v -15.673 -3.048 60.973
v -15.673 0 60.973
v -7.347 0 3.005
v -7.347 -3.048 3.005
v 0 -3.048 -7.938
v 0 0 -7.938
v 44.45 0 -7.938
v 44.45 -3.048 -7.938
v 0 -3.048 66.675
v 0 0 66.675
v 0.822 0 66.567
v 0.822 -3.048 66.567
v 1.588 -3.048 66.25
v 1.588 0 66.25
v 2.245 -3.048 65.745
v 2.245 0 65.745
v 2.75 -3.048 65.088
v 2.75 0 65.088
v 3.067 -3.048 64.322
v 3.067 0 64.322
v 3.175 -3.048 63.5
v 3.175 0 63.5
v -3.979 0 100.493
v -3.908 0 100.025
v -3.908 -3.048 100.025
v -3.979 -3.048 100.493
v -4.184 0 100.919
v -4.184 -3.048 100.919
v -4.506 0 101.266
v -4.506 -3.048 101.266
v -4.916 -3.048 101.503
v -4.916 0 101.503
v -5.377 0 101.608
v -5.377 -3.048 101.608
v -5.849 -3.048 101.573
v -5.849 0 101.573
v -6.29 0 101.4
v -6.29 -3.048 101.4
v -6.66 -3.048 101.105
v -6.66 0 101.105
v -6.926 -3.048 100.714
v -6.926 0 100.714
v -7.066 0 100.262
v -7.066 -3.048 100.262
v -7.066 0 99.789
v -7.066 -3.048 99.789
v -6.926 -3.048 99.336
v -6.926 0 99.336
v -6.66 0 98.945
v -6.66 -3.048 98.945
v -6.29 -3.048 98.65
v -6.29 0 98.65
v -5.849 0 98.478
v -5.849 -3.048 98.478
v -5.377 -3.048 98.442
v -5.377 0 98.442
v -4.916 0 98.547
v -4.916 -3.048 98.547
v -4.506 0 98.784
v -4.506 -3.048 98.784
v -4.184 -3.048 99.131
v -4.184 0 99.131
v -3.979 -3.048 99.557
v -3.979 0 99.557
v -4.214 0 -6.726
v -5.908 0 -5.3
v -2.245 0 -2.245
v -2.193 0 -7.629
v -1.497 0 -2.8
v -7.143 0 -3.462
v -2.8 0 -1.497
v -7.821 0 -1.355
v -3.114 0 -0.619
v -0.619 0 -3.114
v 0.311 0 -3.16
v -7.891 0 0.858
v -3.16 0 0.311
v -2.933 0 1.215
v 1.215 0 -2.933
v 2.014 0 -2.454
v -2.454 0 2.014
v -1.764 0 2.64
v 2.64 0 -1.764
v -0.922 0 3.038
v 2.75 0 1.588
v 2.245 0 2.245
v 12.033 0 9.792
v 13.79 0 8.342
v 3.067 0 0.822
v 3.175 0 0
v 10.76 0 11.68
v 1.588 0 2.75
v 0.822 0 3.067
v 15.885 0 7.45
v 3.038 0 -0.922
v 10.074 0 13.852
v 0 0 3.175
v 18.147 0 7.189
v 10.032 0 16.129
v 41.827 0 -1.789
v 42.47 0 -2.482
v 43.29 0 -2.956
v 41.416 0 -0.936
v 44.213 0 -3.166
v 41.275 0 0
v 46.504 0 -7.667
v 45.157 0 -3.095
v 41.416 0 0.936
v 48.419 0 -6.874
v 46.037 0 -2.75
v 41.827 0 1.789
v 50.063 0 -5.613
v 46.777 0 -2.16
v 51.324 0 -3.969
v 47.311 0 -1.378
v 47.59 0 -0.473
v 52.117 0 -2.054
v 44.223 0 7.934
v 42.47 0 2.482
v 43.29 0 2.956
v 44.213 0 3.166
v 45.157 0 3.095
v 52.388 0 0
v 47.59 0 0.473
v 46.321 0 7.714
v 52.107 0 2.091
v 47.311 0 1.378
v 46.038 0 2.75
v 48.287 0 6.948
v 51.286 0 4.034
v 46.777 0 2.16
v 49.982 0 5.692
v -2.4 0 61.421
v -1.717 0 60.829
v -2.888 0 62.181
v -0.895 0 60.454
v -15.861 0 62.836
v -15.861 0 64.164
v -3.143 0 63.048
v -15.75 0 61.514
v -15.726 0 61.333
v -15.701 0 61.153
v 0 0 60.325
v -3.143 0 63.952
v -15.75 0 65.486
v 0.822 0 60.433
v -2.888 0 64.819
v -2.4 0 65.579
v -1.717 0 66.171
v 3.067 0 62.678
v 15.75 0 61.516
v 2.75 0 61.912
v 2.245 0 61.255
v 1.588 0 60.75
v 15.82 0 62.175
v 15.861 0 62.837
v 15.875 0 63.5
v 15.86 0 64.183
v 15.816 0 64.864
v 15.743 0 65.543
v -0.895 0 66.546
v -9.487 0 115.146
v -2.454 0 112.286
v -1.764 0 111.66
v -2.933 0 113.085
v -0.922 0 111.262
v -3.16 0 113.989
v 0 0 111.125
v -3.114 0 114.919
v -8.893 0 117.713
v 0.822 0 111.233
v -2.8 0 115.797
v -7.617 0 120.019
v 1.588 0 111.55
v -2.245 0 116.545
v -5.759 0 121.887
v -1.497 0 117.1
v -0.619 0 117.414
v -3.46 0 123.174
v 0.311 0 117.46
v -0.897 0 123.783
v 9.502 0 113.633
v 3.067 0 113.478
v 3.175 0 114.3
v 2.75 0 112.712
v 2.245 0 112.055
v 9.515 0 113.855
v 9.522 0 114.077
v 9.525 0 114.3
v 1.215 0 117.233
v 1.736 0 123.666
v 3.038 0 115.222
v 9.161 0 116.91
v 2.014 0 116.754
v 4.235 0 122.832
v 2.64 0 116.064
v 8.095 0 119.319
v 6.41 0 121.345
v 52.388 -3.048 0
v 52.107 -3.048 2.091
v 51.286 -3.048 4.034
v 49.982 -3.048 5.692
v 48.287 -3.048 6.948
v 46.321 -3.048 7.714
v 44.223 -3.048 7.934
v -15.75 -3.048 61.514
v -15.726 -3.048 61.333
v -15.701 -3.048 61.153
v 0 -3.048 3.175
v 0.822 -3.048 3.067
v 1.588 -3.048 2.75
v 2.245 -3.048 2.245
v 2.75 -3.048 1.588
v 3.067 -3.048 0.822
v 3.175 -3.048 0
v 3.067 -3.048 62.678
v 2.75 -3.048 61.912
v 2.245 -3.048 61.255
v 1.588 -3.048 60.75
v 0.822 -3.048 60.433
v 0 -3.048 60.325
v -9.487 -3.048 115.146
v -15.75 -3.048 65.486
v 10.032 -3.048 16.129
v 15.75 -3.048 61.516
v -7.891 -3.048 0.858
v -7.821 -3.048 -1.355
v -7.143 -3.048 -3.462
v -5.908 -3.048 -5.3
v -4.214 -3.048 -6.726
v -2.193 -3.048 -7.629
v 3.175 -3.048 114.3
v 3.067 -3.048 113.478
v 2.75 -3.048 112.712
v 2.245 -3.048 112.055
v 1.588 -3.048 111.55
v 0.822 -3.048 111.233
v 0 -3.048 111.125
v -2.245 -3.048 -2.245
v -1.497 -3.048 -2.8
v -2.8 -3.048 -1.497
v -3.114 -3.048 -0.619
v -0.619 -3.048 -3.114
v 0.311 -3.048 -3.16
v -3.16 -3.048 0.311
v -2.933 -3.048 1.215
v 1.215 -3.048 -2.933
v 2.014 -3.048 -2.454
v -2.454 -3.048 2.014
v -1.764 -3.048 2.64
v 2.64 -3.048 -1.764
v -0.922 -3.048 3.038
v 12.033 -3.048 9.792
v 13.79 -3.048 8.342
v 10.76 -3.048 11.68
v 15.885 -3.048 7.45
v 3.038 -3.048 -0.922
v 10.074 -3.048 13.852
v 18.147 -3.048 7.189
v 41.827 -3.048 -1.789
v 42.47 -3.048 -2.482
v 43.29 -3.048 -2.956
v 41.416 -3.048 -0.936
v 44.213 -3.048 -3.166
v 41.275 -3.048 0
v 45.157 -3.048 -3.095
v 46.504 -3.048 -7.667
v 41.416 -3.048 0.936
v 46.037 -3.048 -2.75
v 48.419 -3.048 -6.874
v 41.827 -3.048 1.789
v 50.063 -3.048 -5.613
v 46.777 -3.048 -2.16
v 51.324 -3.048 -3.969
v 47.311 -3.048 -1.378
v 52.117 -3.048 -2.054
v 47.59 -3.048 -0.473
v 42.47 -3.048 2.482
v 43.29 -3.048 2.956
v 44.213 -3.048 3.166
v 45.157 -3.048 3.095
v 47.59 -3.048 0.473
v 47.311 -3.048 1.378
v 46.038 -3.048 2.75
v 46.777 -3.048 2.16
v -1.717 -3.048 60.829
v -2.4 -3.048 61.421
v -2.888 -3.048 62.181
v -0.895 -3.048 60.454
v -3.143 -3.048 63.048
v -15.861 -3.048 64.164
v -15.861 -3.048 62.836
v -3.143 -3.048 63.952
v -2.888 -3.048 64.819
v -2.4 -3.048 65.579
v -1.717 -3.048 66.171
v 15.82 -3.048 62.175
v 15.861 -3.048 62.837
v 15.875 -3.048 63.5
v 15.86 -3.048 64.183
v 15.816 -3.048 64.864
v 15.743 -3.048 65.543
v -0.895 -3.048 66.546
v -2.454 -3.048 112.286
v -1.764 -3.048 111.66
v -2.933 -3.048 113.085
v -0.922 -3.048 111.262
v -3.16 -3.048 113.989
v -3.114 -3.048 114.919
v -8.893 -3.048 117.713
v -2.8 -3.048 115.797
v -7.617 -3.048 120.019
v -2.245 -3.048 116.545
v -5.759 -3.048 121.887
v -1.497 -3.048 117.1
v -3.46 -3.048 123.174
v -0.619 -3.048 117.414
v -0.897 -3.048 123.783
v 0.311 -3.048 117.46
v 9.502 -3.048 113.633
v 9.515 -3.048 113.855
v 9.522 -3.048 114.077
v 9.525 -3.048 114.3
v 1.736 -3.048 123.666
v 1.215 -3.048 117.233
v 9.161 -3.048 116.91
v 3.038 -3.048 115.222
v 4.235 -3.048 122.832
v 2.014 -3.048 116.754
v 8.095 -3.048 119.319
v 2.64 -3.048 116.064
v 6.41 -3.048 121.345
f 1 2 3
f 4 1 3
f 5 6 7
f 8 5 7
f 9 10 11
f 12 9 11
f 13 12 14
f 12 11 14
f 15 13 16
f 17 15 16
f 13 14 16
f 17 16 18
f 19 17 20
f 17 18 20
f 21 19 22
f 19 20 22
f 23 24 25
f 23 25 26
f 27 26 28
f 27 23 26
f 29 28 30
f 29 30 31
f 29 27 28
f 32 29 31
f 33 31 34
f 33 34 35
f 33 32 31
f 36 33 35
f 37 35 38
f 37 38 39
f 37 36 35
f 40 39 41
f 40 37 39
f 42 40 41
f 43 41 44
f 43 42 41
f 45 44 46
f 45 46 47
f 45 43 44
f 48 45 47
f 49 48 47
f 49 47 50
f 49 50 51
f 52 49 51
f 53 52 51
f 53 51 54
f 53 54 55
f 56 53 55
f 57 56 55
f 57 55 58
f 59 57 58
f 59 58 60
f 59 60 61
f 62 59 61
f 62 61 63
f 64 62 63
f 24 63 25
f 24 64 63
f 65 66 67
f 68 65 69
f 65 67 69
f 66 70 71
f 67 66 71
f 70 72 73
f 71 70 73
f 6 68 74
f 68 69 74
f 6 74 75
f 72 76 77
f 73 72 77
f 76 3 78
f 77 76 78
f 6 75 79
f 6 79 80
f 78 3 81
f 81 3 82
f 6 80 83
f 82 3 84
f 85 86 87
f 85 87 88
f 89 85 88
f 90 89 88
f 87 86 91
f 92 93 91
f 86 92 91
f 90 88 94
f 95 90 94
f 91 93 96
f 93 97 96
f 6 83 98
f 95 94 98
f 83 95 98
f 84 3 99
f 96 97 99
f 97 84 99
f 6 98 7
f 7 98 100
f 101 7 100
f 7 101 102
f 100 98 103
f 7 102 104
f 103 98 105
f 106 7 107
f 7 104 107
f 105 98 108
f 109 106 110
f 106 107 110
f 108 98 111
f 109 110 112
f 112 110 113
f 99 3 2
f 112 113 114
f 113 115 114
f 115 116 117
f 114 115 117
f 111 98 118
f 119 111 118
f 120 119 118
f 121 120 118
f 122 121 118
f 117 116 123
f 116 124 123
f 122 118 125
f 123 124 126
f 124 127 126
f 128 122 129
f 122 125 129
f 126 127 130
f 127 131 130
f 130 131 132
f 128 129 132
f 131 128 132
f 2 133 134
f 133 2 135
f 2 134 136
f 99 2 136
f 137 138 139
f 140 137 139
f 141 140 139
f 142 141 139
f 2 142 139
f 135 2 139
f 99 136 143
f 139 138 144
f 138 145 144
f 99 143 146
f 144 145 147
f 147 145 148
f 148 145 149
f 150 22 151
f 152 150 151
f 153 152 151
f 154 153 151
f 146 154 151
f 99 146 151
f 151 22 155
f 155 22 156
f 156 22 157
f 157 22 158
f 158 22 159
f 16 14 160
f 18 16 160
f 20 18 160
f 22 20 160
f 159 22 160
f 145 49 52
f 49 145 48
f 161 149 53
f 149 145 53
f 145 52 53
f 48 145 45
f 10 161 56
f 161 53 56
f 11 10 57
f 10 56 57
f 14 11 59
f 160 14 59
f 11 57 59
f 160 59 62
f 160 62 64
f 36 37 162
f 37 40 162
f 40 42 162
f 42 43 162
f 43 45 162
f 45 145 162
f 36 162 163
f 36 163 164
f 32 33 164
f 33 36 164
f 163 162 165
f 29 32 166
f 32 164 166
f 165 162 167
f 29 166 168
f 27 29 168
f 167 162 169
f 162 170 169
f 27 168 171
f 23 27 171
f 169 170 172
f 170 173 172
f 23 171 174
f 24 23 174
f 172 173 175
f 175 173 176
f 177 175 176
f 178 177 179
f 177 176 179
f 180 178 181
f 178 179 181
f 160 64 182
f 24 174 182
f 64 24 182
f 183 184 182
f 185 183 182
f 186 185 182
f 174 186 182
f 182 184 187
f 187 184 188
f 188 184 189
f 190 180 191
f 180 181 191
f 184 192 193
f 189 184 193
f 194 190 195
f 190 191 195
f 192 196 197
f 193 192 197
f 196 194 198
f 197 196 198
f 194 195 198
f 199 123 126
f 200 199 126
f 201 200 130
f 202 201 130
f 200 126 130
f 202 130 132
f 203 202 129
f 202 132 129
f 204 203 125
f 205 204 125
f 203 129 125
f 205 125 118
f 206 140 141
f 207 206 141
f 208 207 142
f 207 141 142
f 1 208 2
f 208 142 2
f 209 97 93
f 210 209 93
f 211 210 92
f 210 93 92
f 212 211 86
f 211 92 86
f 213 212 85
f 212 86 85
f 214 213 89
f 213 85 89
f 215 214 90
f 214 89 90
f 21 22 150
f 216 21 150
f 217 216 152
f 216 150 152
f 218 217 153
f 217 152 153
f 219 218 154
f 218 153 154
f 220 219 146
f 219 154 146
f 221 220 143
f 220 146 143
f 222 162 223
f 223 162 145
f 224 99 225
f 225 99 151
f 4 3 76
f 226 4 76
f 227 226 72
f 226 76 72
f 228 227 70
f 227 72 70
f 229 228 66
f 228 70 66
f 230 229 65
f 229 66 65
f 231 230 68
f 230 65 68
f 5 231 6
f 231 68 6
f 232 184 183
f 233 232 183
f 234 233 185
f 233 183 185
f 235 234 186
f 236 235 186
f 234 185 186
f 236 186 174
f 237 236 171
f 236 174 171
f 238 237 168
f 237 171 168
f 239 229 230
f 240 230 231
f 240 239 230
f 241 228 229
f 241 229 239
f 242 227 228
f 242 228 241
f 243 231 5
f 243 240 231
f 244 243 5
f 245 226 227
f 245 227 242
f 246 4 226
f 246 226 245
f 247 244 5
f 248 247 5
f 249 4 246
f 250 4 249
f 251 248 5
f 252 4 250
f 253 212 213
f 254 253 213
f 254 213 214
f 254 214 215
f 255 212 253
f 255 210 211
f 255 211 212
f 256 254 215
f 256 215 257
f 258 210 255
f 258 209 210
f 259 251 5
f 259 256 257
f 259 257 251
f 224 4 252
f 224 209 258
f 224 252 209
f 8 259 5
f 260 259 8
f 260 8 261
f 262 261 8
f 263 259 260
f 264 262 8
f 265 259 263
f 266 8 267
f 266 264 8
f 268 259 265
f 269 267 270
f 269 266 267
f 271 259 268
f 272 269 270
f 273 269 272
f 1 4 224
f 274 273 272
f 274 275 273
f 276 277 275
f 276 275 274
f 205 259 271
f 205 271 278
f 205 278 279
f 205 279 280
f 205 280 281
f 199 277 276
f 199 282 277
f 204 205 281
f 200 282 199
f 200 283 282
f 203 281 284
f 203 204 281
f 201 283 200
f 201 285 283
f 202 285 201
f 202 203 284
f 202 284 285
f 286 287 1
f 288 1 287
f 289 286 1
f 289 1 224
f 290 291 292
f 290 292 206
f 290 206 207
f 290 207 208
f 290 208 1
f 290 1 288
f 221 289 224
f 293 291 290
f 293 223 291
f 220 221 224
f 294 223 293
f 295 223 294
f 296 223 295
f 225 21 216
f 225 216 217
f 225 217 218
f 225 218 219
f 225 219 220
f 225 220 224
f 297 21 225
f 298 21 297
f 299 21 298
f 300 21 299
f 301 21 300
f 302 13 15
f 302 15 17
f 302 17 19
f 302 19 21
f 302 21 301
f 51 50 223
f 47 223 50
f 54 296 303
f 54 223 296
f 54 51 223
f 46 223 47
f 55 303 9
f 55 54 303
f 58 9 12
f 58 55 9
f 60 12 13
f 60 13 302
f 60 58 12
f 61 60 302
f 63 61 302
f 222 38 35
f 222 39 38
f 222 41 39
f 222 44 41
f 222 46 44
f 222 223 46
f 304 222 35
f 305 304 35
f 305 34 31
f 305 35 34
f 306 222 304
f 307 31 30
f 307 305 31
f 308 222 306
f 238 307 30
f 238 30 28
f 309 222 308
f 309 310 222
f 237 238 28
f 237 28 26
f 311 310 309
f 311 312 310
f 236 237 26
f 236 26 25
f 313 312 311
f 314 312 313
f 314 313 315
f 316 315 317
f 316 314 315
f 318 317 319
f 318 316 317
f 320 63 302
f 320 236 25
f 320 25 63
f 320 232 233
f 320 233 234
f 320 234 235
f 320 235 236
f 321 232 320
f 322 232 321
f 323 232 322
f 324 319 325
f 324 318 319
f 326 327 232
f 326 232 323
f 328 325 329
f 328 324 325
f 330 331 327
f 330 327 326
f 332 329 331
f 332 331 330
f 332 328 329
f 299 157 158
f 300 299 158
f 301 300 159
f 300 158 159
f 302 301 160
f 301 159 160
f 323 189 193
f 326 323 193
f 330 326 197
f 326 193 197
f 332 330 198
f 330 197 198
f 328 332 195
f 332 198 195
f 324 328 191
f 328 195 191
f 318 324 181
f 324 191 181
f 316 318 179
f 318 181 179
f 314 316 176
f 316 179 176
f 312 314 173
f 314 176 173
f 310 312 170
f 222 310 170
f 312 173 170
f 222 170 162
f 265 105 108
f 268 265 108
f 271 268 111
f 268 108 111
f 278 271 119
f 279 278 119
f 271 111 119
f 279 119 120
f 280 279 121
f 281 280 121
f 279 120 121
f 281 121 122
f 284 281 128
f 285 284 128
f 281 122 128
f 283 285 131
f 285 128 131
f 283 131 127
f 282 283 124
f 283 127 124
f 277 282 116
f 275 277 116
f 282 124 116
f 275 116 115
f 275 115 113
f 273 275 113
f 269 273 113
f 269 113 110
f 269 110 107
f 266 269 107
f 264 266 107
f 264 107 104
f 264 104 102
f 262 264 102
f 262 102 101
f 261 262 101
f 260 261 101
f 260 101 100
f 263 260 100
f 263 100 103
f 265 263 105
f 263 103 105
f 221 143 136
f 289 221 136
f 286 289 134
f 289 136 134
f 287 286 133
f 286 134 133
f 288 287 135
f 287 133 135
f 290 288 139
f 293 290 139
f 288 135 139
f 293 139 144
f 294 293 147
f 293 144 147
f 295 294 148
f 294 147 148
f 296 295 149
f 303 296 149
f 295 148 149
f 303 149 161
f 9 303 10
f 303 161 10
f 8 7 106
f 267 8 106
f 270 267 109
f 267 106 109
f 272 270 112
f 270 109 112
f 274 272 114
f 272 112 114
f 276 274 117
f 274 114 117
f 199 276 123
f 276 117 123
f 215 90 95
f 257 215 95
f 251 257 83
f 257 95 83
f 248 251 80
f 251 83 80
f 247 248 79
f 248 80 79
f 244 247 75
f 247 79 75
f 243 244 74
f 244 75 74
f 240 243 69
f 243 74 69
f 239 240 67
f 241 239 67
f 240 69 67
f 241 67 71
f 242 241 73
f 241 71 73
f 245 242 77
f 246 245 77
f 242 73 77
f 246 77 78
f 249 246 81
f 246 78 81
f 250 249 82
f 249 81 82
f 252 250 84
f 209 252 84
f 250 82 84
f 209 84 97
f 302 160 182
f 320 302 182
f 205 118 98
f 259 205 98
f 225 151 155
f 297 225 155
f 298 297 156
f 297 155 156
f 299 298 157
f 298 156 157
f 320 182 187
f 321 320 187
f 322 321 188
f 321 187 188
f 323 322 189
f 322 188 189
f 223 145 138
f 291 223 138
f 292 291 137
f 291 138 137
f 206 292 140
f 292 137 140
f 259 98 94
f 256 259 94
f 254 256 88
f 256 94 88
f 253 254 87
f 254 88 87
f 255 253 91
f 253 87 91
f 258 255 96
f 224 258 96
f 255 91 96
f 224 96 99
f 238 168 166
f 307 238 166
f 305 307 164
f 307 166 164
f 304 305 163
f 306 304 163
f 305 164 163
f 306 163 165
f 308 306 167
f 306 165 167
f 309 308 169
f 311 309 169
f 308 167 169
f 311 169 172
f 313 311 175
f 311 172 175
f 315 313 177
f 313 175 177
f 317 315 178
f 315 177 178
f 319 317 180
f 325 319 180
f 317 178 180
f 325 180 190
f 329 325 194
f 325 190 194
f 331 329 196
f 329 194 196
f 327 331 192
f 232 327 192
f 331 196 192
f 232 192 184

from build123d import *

# Parameters (mm, degrees)
F0_R     = 1.5875
F1_DEPTH = 3.048


with BuildPart() as f1:
    # F0 (on Front) → F1 (new body)
    with BuildSketch(Plane.XZ):
        with BuildLine():
            ThreePointArc((3.175, 0), (-2.2450640303, -2.2450640303), (0, 3.175))
            Line((0, 3.175), (0, 7.9375))
            ThreePointArc((0, 7.9375), (-4.4245915599, 6.589908632), (-7.3468104853, 3.0047099599))
            ThreePointArc((-7.3468104853, 3.0047099599), (-6.589908632, -4.4245915599), (0, -7.9375))
            ThreePointArc((0, -7.9375), (5.6126600757, -5.6126600757), (7.9375, 0))
            Line((7.9375, 0), (3.175, 0))
        make_face()
        with BuildLine():
            ThreePointArc((-7.3468104853, 3.0047099599), (-4.4245915599, 6.589908632), (0, 7.9375))
            Line((0, 7.9375), (0, 47.625))
            ThreePointArc((0, 47.625), (-10.2932687392, 51.4142958971), (-15.6726173523, 60.9732055229))
            Line((-15.6726173523, 60.9732055229), (-7.3468104853, 3.0047099599))
        make_face()
        with BuildLine():
            Line((0, 47.625), (0, 7.9375))
            ThreePointArc((0, 7.9375), (5.6126600757, 5.6126600757), (7.9375, 0))
            Line((7.9375, 0), (36.5125, 0))
            ThreePointArc((36.5125, 0), (38.7576827175, 5.5318559458), (44.2230965871, 7.9342561776))
            Line((44.2230965871, 7.9342561776), (18.1474563207, 7.1885464806))
            ThreePointArc((18.1474563207, 7.1885464806), (12.0333180798, 9.7922381017), (10.0323453348, 16.129272468))
            Line((10.0323453348, 16.129272468), (15.7504882737, 61.515625))
            ThreePointArc((15.7504882737, 61.515625), (10.5003255158, 51.59375), (0, 47.625))
        make_face()
        with BuildLine():
            Line((36.5125, 0), (7.9375, 0))
            ThreePointArc((7.9375, 0), (5.6126600757, -5.6126600757), (0, -7.9375))
            Line((0, -7.9375), (44.45, -7.9375))
            ThreePointArc((44.45, -7.9375), (38.8373399243, -5.6126600757), (36.5125, 0))
        make_face()
        with BuildLine():
            ThreePointArc((-15.6726173523, 60.9732055229), (-10.2932687392, 51.4142958971), (0, 47.625))
            Line((0, 47.625), (0, 60.325))
            ThreePointArc((0, 60.325), (-3.175, 63.5), (0, 66.675))
            Line((0, 66.675), (0, 79.375))
            ThreePointArc((0, 79.375), (-10.4995761896, 75.4069108016), (-15.7502383805, 65.4863574599))
            ThreePointArc((-15.7502383805, 65.4863574599), (-15.875, 63.5), (-15.7502383805, 61.5136425401))
            Line((-15.7502383805, 61.5136425401), (-15.6726173523, 60.9732055229))
        make_face()
        with BuildLine():
            Line((0, 60.325), (0, 47.625))
            ThreePointArc((0, 47.625), (10.5003255158, 51.59375), (15.7504882737, 61.515625))
            ThreePointArc((15.7504882737, 61.515625), (15.8438414904, 62.5058612634), (15.875, 63.5))
            ThreePointArc((15.875, 63.5), (15.8419565013, 64.5237378624), (15.742963564, 65.5432139445))
            ThreePointArc((15.742963564, 65.5432139445), (10.4780628847, 75.425846854), (0, 79.375))
            Line((0, 79.375), (0, 66.675))
            ThreePointArc((0, 66.675), (2.2450640303, 65.7450640303), (3.175, 63.5))
            ThreePointArc((3.175, 63.5), (2.2450640303, 61.2549359697), (0, 60.325))
        make_face()
        with BuildLine():
            ThreePointArc((44.2230965871, 7.9342561776), (38.7576827175, 5.5318559458), (36.5125, 0))
            ThreePointArc((36.5125, 0), (38.8373399243, -5.6126600757), (44.45, -7.9375))
            ThreePointArc((44.45, -7.9375), (50.0626600757, -5.6126600757), (52.3875, 0))
            ThreePointArc((52.3875, 0), (49.9818559458, 5.6923172825), (44.2230965871, 7.9342561776))
        make_face()
        with BuildLine():
            ThreePointArc((47.625, 0), (44.45, -3.175), (41.275, 0))
            ThreePointArc((41.275, 0), (44.45, 3.175), (47.625, 0))
        make_face(mode=Mode.SUBTRACT)
        with BuildLine():
            ThreePointArc((-15.7502383805, 61.5136425401), (-15.7137514185, 61.243090308), (-15.6726173523, 60.9732055229))
            Line((-15.6726173523, 60.9732055229), (-15.7502383805, 61.5136425401))
        make_face()
        with BuildLine():
            ThreePointArc((-15.7502383805, 65.4863574599), (-10.4995761896, 75.4069108016), (0, 79.375))
            Line((0, 79.375), (0, 104.775))
            ThreePointArc((0, 104.775), (-7.0279952587, 107.8709325992), (-9.4873396767, 115.1461742481))
            Line((-9.4873396767, 115.1461742481), (-15.7502383805, 65.4863574599))
        make_face()
        with Locations((-5.4959040135, 100.0252)):
            Circle(F0_R, mode=Mode.SUBTRACT)
        with BuildLine():
            Line((0, 104.775), (0, 79.375))
            ThreePointArc((0, 79.375), (10.4780628847, 75.425846854), (15.742963564, 65.5432139445))
            Line((15.742963564, 65.5432139445), (9.5016077683, 113.6328607214))
            ThreePointArc((9.5016077683, 113.6328607214), (6.4950413152, 107.3329300768), (0, 104.775))
        make_face()
        with BuildLine():
            ThreePointArc((-9.4873396767, 115.1461742481), (-7.0279952587, 107.8709325992), (0, 104.775))
            ThreePointArc((0, 104.775), (6.4950413152, 107.3329300768), (9.5016077683, 113.6328607214))
            ThreePointArc((9.5016077683, 113.6328607214), (9.5191501457, 113.9662253704), (9.525, 114.3))
            ThreePointArc((9.525, 114.3), (0.4235059498, 123.8155802614), (-9.4873396767, 115.1461742481))
        make_face()
        with BuildLine():
            ThreePointArc((3.175, 114.3), (2.2450640303, 112.0549359697), (0, 111.125))
            ThreePointArc((0, 111.125), (-2.2450640303, 116.5450640303), (3.175, 114.3))
        make_face(mode=Mode.SUBTRACT)
        with BuildLine():
            Line((0, 7.9375), (0, 3.175))
            ThreePointArc((0, 3.175), (2.2450640303, 2.2450640303), (3.175, 0))
            Line((3.175, 0), (7.9375, 0))
            ThreePointArc((7.9375, 0), (5.6126600757, 5.6126600757), (0, 7.9375))
        make_face()
    extrude(amount=F1_DEPTH)


solid = f1.part
